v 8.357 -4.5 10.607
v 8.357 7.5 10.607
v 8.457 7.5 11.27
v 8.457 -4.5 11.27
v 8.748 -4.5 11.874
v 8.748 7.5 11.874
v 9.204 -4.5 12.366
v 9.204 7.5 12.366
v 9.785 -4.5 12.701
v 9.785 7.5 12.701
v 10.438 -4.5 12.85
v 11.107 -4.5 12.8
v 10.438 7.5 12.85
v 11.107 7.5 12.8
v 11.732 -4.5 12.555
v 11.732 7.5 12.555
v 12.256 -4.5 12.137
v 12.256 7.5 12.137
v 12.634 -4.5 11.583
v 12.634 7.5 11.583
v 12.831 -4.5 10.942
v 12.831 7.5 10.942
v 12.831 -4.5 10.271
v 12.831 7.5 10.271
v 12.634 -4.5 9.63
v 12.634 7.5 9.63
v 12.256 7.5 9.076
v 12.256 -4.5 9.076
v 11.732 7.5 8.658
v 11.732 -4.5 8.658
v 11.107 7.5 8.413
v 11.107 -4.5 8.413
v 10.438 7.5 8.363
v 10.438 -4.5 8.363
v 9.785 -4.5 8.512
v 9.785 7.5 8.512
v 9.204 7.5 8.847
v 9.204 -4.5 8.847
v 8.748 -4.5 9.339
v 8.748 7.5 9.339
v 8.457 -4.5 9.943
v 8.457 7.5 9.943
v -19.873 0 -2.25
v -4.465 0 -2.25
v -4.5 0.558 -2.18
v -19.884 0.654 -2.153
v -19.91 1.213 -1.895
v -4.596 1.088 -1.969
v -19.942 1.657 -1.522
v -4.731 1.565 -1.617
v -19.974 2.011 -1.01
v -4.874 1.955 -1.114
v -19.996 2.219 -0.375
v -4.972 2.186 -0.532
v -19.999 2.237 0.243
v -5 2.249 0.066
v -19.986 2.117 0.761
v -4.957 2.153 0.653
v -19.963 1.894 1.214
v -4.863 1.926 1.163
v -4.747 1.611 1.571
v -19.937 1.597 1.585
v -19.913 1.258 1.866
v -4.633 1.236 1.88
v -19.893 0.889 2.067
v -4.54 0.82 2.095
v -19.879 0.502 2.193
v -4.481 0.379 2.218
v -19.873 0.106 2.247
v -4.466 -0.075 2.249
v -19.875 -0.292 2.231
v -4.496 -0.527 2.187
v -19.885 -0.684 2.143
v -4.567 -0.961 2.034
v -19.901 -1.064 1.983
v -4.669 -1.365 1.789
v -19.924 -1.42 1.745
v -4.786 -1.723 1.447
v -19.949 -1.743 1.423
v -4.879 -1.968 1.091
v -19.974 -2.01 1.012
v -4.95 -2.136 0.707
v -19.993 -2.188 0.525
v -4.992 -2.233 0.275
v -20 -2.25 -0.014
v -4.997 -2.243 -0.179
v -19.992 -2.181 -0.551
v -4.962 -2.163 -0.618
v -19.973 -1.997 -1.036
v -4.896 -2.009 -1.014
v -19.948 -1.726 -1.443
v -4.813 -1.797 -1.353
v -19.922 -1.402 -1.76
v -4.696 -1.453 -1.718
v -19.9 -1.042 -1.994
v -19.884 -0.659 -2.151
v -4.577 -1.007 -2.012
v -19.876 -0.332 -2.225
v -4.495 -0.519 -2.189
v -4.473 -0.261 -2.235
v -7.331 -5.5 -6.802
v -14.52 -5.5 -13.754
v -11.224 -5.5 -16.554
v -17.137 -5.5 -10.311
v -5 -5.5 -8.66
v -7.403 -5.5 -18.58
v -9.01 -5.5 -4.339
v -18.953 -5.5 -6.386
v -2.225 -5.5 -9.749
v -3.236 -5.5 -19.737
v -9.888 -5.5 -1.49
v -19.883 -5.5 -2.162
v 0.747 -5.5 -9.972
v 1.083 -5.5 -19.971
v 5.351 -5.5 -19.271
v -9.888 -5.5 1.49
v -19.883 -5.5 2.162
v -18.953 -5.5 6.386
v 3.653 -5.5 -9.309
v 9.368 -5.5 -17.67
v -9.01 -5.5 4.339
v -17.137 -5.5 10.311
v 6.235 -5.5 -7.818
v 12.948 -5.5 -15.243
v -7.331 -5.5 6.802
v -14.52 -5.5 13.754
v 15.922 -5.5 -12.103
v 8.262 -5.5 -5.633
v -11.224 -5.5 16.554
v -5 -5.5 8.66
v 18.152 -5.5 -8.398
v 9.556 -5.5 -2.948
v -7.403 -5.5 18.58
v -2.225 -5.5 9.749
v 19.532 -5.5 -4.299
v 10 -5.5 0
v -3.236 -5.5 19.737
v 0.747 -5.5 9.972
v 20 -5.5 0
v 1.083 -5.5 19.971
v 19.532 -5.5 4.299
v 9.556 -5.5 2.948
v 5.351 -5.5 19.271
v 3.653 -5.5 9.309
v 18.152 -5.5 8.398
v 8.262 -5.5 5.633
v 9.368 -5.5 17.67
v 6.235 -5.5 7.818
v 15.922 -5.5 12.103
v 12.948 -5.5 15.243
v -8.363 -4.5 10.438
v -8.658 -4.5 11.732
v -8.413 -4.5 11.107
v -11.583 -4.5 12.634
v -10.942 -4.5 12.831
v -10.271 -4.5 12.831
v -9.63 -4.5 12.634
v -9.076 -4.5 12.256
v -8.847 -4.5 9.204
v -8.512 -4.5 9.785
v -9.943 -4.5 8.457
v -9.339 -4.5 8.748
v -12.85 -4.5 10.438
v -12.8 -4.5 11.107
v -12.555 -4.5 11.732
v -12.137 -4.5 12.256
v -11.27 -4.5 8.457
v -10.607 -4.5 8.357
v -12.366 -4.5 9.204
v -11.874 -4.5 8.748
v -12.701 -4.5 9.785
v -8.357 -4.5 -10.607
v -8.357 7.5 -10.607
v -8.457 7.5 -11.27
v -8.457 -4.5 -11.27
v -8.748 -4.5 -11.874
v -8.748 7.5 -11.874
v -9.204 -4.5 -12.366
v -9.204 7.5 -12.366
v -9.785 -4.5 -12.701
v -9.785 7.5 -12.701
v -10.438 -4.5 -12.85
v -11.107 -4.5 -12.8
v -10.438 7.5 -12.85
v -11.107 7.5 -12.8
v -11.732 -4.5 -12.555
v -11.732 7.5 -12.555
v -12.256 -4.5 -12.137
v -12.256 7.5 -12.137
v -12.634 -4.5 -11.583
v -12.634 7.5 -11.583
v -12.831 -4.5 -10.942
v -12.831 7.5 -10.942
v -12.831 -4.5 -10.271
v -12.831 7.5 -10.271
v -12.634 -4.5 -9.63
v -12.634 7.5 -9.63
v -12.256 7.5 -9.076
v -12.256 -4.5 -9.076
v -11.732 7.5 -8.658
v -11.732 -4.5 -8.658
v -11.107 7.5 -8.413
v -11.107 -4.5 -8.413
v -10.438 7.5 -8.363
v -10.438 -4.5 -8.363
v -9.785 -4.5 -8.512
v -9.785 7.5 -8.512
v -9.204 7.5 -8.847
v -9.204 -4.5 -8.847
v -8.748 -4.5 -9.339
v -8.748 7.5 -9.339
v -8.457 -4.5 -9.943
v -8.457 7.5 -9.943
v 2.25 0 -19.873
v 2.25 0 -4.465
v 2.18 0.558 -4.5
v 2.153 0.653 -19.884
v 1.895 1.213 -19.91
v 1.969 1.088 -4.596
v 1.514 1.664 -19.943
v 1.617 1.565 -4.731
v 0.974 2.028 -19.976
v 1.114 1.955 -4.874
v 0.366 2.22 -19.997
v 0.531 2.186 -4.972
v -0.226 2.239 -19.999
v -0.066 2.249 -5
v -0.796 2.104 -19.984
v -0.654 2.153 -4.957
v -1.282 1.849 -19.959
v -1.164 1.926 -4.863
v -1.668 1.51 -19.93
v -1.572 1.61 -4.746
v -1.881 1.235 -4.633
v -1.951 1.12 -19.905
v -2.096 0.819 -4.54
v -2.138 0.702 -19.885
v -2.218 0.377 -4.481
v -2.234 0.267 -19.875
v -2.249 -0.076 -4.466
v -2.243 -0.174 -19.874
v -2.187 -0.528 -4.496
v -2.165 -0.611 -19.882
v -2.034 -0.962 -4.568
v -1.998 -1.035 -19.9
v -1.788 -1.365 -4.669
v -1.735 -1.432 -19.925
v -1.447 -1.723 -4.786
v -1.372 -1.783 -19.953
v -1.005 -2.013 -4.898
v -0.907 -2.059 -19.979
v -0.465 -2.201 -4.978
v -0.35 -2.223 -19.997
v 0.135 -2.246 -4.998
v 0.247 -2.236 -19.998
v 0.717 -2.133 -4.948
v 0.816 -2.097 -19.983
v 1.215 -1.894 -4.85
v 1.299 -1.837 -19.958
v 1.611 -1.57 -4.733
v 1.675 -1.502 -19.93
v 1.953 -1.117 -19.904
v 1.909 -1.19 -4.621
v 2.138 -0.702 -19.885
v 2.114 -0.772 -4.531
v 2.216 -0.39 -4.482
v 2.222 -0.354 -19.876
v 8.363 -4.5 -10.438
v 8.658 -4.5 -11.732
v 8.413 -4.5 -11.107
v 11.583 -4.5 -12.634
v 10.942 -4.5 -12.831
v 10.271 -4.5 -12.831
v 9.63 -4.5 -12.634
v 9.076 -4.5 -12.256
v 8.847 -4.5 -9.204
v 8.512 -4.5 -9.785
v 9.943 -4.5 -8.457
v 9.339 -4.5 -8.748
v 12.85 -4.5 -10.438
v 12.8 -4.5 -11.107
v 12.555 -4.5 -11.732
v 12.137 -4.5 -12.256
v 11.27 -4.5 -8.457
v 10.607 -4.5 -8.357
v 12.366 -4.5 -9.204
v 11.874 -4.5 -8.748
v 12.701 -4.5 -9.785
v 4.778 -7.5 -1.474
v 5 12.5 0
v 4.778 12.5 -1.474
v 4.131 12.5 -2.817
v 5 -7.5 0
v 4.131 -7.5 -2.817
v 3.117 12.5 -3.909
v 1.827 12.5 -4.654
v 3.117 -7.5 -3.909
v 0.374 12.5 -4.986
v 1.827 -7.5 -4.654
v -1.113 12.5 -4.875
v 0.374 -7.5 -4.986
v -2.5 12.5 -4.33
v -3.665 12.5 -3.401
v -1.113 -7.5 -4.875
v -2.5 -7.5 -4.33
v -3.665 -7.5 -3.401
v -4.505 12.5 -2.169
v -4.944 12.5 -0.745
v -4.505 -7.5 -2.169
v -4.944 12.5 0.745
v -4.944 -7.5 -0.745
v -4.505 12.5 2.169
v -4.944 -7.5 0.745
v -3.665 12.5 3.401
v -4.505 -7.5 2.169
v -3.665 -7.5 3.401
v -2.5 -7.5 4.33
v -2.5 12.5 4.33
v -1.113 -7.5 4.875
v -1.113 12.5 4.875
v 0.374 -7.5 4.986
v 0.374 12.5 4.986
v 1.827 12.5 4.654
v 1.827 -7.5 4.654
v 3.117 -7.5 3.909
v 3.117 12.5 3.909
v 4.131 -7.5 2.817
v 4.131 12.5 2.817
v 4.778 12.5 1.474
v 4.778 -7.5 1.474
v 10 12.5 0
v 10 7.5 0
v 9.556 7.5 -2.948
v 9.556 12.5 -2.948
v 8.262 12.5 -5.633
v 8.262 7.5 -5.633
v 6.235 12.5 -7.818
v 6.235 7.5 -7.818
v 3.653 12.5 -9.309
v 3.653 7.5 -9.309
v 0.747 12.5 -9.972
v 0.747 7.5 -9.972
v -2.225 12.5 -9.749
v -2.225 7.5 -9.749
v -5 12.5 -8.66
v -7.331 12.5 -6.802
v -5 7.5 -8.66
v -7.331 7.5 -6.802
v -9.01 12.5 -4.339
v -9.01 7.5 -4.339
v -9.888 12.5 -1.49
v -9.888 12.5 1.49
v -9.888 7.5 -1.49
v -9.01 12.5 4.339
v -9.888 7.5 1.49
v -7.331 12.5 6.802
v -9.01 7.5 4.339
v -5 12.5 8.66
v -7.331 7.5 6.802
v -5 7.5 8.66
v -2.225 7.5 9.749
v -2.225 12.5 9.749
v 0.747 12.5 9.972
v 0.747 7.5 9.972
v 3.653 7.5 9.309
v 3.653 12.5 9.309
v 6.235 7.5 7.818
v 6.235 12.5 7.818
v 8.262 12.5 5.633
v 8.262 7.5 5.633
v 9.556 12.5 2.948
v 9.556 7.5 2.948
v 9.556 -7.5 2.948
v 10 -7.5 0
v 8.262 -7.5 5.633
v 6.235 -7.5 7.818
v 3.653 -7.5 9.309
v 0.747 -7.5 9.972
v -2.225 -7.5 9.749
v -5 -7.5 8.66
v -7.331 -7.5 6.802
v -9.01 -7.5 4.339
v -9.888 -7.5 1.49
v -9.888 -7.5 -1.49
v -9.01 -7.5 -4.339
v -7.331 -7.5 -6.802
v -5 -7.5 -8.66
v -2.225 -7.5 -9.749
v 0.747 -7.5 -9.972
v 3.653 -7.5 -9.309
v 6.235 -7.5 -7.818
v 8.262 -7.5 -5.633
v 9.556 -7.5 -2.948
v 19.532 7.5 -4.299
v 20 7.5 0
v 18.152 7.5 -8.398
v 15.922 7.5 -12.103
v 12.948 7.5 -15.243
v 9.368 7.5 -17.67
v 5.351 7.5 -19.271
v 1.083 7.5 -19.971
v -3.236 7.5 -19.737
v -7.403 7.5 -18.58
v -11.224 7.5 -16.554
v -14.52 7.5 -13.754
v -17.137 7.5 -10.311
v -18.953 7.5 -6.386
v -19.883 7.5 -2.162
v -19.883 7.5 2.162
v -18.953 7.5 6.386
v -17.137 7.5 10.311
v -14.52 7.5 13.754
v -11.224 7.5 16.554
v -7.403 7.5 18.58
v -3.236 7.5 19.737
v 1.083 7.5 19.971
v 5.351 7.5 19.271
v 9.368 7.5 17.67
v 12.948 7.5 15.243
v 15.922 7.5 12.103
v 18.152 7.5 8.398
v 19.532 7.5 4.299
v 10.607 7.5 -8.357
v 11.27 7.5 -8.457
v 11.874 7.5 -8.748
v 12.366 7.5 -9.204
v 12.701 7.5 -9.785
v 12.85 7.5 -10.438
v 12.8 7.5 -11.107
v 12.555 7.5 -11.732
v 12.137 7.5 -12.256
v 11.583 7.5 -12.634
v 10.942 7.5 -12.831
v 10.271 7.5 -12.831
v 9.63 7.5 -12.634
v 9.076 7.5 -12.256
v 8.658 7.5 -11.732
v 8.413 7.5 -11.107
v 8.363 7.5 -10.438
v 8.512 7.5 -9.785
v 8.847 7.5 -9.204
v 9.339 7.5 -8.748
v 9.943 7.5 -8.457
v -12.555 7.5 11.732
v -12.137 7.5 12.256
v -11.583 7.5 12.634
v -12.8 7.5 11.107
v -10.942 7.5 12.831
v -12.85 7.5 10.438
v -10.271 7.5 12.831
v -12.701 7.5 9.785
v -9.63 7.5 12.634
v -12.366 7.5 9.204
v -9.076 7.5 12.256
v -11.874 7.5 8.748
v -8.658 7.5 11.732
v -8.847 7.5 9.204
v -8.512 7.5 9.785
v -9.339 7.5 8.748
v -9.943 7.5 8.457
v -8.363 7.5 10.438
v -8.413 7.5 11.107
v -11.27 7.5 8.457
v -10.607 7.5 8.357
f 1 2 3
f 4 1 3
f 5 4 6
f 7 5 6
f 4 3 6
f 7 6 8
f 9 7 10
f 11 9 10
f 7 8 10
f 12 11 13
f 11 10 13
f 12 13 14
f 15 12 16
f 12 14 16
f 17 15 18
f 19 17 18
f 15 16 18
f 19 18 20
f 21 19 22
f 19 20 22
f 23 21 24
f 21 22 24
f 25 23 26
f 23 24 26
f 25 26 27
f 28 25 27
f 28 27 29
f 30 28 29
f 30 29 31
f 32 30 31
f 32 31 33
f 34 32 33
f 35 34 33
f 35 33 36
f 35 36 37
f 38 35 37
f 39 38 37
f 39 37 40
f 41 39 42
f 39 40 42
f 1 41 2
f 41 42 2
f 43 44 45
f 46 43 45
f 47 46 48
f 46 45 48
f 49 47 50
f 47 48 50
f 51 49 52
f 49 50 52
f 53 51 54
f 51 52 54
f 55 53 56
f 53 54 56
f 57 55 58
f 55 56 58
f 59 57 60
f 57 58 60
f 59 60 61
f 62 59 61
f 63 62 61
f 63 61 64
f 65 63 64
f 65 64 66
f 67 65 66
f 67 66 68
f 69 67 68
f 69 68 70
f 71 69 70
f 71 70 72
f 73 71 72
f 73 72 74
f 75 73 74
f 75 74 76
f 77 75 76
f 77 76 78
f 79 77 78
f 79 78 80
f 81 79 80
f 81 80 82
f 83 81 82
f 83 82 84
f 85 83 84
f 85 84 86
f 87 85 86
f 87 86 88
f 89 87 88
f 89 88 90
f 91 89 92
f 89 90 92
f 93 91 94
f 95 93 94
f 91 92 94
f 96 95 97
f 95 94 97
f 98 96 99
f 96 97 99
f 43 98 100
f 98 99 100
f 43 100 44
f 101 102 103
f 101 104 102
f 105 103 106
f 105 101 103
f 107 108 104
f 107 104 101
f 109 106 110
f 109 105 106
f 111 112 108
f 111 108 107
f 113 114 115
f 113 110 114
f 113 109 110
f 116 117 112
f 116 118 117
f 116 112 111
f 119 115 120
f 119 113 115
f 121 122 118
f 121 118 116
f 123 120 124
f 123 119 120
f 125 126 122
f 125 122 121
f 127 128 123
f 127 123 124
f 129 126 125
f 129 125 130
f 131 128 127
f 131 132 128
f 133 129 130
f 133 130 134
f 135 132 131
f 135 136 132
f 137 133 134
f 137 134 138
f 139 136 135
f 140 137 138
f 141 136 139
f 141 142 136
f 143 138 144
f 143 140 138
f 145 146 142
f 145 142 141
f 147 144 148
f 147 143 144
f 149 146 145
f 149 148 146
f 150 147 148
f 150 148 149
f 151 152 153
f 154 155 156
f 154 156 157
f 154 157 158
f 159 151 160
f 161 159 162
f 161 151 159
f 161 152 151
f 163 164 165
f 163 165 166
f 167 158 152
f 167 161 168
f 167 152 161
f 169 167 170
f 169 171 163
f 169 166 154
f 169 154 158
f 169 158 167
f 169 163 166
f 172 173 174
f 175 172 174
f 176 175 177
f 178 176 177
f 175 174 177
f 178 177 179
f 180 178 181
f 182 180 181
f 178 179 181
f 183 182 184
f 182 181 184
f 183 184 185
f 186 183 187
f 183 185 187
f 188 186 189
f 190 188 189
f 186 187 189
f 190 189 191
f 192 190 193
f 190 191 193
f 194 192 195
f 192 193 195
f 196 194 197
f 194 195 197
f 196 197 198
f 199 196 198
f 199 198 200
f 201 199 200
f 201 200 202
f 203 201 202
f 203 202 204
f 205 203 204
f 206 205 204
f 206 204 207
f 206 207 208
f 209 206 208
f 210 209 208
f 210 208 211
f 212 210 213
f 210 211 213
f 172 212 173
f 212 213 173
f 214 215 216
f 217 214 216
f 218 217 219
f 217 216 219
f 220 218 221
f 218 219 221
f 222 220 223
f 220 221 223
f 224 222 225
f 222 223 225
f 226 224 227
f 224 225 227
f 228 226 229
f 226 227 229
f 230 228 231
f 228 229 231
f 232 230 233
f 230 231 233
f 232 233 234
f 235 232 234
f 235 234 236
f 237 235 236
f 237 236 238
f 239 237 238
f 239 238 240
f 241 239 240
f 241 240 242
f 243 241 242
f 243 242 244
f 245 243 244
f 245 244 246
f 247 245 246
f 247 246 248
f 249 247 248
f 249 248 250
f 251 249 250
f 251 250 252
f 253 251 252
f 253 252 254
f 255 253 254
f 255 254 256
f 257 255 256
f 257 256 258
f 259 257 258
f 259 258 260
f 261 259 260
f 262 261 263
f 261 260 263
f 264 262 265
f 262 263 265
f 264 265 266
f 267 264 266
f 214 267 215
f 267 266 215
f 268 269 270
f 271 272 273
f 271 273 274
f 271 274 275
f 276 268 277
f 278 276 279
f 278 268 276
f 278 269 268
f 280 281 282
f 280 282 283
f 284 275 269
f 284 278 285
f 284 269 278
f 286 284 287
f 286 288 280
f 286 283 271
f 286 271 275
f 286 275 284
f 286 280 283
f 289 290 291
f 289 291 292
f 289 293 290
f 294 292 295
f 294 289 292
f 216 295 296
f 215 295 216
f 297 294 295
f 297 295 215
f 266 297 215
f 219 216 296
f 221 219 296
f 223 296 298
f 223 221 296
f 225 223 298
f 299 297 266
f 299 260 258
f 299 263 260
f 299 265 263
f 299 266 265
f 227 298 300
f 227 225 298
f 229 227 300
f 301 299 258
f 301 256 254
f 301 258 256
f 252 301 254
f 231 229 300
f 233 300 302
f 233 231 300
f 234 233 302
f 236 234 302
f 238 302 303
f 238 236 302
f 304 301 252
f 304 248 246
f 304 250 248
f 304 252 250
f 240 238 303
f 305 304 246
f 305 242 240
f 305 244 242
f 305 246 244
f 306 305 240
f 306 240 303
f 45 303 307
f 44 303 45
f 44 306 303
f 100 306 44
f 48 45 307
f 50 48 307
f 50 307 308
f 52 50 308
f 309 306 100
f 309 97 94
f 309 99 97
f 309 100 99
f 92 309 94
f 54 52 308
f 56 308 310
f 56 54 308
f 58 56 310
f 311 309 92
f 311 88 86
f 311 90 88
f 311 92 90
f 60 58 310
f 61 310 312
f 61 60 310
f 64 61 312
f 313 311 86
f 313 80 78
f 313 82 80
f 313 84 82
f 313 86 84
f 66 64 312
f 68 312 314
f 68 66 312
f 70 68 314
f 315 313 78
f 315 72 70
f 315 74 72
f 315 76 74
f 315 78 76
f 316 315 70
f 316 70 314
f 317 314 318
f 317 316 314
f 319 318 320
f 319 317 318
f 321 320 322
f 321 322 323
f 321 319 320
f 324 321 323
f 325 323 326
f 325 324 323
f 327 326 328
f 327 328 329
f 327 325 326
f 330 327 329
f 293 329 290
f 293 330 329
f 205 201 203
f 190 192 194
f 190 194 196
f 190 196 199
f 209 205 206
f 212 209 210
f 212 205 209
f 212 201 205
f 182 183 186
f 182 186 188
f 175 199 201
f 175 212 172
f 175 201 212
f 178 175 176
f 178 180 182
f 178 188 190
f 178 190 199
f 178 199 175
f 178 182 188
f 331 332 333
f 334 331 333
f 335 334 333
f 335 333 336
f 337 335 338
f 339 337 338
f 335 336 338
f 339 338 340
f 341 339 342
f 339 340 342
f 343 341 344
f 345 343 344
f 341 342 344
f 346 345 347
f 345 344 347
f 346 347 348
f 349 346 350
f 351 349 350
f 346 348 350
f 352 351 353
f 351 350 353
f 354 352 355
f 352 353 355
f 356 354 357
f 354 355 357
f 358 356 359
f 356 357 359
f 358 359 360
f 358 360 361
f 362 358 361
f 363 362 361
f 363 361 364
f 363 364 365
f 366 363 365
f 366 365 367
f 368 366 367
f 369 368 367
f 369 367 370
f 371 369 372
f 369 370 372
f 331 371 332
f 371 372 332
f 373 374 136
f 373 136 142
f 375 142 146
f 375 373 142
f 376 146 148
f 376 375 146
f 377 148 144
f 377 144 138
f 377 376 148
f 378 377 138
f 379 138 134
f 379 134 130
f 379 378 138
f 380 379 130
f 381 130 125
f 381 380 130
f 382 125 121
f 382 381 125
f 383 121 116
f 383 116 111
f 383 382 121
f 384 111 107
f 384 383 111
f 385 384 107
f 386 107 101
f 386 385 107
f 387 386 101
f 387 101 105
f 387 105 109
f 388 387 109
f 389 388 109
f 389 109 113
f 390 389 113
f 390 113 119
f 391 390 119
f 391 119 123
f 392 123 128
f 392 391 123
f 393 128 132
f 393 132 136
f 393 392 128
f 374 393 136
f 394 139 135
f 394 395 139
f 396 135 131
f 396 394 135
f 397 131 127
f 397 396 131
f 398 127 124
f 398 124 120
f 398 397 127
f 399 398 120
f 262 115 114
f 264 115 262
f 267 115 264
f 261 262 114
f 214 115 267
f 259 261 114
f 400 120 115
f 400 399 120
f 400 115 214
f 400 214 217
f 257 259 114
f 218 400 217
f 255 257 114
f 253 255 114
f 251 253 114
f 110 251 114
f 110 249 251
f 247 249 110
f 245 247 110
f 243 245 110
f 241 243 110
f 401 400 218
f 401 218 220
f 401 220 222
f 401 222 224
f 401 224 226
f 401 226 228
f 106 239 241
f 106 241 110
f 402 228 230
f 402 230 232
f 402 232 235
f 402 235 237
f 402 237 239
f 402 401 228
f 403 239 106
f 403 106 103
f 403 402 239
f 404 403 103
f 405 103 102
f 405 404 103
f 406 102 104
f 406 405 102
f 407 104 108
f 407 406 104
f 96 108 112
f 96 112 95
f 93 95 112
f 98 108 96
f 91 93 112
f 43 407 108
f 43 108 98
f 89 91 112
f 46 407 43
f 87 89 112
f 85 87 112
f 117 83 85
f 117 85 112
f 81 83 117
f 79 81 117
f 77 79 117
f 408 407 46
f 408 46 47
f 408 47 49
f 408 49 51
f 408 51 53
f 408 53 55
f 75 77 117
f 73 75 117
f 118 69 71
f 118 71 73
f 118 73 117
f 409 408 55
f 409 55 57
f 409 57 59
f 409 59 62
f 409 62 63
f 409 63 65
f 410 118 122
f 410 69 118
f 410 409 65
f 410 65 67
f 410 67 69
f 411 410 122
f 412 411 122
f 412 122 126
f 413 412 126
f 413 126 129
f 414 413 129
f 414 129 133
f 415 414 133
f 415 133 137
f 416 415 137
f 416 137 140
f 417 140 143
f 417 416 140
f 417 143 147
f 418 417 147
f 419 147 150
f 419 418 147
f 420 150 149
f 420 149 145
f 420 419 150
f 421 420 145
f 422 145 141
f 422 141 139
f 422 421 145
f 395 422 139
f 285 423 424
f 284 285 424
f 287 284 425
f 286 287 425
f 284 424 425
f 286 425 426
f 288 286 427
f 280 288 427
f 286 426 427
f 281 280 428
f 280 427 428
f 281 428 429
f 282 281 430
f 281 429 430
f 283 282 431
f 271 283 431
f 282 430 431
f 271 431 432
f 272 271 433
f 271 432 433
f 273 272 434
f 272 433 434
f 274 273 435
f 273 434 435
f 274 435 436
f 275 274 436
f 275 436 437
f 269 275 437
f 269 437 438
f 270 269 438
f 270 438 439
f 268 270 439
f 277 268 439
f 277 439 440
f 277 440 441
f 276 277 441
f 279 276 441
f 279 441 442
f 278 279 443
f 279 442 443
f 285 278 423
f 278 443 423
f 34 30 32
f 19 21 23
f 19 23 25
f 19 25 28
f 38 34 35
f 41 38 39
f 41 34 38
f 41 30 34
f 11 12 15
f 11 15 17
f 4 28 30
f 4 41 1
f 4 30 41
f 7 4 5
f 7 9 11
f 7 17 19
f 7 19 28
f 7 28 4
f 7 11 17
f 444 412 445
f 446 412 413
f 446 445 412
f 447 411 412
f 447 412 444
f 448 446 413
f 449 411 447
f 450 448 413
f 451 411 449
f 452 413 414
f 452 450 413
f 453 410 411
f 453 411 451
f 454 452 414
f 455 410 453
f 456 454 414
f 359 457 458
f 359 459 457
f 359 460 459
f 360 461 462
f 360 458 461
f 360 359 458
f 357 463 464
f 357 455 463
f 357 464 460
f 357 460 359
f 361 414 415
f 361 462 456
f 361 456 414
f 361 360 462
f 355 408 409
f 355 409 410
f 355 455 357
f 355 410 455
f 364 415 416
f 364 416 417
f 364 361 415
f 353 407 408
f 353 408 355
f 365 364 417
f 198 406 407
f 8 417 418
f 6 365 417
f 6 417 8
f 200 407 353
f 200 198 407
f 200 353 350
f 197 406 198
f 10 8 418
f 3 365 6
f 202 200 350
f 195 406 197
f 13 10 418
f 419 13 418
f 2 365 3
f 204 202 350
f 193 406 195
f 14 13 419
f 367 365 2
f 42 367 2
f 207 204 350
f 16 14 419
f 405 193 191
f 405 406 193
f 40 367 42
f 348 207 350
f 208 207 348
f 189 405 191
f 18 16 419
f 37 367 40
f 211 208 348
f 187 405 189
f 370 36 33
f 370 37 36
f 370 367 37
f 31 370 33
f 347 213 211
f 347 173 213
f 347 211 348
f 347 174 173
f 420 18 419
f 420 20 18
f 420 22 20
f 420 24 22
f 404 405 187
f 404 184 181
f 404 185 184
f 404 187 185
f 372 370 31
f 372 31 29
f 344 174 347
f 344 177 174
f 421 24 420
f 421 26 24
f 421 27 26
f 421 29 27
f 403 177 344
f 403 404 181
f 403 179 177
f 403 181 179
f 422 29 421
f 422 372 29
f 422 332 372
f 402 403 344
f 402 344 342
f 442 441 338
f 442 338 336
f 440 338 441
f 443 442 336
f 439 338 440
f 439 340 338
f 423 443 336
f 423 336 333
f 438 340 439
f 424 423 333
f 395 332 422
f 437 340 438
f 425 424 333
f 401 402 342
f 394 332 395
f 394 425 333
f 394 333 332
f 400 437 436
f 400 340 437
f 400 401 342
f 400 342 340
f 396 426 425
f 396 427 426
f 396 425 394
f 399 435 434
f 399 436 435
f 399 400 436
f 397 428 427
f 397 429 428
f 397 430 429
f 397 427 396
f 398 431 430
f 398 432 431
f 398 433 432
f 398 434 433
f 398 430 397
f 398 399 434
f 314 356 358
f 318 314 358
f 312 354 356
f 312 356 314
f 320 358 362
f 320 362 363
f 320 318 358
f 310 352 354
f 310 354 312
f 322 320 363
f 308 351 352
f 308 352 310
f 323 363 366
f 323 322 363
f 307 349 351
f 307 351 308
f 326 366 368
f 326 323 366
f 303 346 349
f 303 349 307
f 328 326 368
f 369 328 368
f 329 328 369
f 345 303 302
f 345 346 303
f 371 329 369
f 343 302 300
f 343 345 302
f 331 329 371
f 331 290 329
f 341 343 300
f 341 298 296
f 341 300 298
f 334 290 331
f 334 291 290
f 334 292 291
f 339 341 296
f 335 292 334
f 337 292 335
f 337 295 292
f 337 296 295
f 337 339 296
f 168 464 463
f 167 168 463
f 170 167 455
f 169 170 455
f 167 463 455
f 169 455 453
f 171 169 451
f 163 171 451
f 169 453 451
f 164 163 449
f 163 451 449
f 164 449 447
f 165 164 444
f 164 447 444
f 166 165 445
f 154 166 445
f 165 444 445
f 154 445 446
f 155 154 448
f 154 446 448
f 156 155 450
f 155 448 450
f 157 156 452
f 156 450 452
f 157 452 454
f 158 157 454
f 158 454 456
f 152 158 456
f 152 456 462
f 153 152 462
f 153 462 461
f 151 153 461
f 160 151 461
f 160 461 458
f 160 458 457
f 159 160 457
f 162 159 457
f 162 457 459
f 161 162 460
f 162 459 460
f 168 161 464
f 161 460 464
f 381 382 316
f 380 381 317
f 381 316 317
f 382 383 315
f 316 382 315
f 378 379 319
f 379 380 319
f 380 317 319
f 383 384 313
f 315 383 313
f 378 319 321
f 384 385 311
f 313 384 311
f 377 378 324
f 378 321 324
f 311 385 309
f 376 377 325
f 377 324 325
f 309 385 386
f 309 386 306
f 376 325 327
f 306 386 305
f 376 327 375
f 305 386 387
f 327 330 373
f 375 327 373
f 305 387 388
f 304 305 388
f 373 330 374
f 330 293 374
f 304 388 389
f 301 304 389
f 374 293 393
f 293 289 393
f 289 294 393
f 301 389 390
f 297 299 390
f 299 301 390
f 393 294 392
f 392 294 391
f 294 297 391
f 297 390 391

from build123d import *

# Parameters (mm, degrees)
SKETCH1_R           = 20
SKETCH1_R_2         = 5
BOSS_EXTRUDE1_DEPTH = 7.5
SKETCH2_R           = 2.25
CUT_EXTRUDE1_DEPTH  = 12
CIRPATTERN1_COUNT   = 4
SKETCH3_R           = 2.25
CUT_EXTRUDE2_DEPTH  = 21
CIRPATTERN2_COUNT   = 2
CIRPATTERN2_ANGLE   = 90
SKETCH4_R           = 23.708466839
SKETCH4_R_2         = 10
CUT_EXTRUDE3_DEPTH  = 2
SKETCH5_R           = 10
SKETCH5_R_2         = 5
BOSS_EXTRUDE2_DEPTH = 5


with BuildPart() as part:
    # Sketch1 → Boss-Extrude1 (new body, symmetric)
    with BuildSketch(Plane(origin=(0, 0, 0), x_dir=(1, 0, 0), z_dir=(0, 1, 0))):
        Circle(SKETCH1_R)
        Circle(SKETCH1_R_2, mode=Mode.SUBTRACT)
    extrude(amount=BOSS_EXTRUDE1_DEPTH, both=True)

    # Sketch2 → Cut-Extrude1 (cut)
    with BuildSketch(Plane(origin=(0, 7.5, 0), x_dir=(1, 0, 0), z_dir=(0, 1, 0))):
        with Locations((-10.606601718, 10.606601718)):
            Circle(SKETCH2_R)
    cut_extrude1 = extrude(amount=-CUT_EXTRUDE1_DEPTH, mode=Mode.SUBTRACT)

    # CirPattern1: Cut-Extrude1 ×4 about axis
    cirpattern1_axis = Axis((0, 0, 0), (0, 1, 0))
    for i in range(1, CIRPATTERN1_COUNT):
        add(cut_extrude1.rotate(cirpattern1_axis, i * 360 / CIRPATTERN1_COUNT), mode=Mode.SUBTRACT)

    # Sketch3 → Cut-Extrude2 (cut, through all)
    with BuildSketch(Plane.XY):
        Circle(SKETCH3_R)
    cut_extrude2 = extrude(amount=-CUT_EXTRUDE2_DEPTH, mode=Mode.SUBTRACT)

    # CirPattern2: Cut-Extrude2 ×2 about axis
    cirpattern2_axis = Axis((0, 7.5, 0), (0, 1, 0))
    for i in range(1, CIRPATTERN2_COUNT):
        add(cut_extrude2.rotate(cirpattern2_axis, i * CIRPATTERN2_ANGLE / (CIRPATTERN2_COUNT - 1)), mode=Mode.SUBTRACT)

    # Sketch4 → Cut-Extrude3 (cut)
    with BuildSketch(Plane.XZ.offset(7.5)):
        Circle(SKETCH4_R)
        Circle(SKETCH4_R_2, mode=Mode.SUBTRACT)
    extrude(amount=-CUT_EXTRUDE3_DEPTH, mode=Mode.SUBTRACT)

    # Sketch5 → Boss-Extrude2 (add)
    with BuildSketch(Plane(origin=(0, 7.5, 0), x_dir=(1, 0, 0), z_dir=(0, 1, 0))):
        Circle(SKETCH5_R)
        Circle(SKETCH5_R_2, mode=Mode.SUBTRACT)
    extrude(amount=BOSS_EXTRUDE2_DEPTH)


solid = part.part
